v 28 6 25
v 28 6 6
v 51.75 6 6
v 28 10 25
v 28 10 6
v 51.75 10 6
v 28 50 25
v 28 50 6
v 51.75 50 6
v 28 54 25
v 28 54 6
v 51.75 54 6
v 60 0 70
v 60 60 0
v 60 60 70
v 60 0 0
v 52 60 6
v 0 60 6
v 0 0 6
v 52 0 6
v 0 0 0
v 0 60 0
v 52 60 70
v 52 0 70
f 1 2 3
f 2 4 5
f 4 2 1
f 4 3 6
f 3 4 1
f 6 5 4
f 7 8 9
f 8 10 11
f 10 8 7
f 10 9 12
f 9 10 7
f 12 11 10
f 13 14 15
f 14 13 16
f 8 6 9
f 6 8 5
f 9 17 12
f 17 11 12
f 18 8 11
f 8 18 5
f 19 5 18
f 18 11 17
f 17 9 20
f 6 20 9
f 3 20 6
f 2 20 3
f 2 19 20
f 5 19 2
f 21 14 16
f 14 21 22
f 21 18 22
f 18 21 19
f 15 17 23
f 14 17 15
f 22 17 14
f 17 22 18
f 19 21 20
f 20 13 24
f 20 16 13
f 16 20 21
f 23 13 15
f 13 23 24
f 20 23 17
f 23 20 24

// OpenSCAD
$fn = 32;

// ----------------------------------------------------------------------
// Rib bracket: 2-gusset L bracket
// ----------------------------------------------------------------------

// --- parameters (mm) ---
base_l = 60;              // foot length, X
base_w = 60;              // foot width, Y
base_t = 6;               // foot thickness
plate_t = 8;              // upright plate thickness
plate_h = 70;             // overall height
gus_l = 24;               // gusset leg along the foot
gus_h = 20;               // gusset height
gus_t = 4;                // gusset thickness
gus_edge = 6;             // gusset margin from the foot edge
n_gus = 2;                // gusset count

gus_pitch = (base_w - 2 * gus_edge - gus_t) / (n_gus - 1);  // gusset pitch

union() {
  cube([base_l, base_w, base_t]);
  translate([base_l - plate_t, 0, base_t - 1])
    cube([plate_t, base_w, plate_h - base_t + 1]);
  for (i = [0 : n_gus - 1])
    translate([base_l - plate_t - gus_l, gus_edge + i * gus_pitch, base_t - 1])
      rotate([-90, 0, 0])
        linear_extrude(height = gus_t)
          polygon(points = [[0, 0], [gus_l + 1, 0], [0, -gus_h]]);
}
